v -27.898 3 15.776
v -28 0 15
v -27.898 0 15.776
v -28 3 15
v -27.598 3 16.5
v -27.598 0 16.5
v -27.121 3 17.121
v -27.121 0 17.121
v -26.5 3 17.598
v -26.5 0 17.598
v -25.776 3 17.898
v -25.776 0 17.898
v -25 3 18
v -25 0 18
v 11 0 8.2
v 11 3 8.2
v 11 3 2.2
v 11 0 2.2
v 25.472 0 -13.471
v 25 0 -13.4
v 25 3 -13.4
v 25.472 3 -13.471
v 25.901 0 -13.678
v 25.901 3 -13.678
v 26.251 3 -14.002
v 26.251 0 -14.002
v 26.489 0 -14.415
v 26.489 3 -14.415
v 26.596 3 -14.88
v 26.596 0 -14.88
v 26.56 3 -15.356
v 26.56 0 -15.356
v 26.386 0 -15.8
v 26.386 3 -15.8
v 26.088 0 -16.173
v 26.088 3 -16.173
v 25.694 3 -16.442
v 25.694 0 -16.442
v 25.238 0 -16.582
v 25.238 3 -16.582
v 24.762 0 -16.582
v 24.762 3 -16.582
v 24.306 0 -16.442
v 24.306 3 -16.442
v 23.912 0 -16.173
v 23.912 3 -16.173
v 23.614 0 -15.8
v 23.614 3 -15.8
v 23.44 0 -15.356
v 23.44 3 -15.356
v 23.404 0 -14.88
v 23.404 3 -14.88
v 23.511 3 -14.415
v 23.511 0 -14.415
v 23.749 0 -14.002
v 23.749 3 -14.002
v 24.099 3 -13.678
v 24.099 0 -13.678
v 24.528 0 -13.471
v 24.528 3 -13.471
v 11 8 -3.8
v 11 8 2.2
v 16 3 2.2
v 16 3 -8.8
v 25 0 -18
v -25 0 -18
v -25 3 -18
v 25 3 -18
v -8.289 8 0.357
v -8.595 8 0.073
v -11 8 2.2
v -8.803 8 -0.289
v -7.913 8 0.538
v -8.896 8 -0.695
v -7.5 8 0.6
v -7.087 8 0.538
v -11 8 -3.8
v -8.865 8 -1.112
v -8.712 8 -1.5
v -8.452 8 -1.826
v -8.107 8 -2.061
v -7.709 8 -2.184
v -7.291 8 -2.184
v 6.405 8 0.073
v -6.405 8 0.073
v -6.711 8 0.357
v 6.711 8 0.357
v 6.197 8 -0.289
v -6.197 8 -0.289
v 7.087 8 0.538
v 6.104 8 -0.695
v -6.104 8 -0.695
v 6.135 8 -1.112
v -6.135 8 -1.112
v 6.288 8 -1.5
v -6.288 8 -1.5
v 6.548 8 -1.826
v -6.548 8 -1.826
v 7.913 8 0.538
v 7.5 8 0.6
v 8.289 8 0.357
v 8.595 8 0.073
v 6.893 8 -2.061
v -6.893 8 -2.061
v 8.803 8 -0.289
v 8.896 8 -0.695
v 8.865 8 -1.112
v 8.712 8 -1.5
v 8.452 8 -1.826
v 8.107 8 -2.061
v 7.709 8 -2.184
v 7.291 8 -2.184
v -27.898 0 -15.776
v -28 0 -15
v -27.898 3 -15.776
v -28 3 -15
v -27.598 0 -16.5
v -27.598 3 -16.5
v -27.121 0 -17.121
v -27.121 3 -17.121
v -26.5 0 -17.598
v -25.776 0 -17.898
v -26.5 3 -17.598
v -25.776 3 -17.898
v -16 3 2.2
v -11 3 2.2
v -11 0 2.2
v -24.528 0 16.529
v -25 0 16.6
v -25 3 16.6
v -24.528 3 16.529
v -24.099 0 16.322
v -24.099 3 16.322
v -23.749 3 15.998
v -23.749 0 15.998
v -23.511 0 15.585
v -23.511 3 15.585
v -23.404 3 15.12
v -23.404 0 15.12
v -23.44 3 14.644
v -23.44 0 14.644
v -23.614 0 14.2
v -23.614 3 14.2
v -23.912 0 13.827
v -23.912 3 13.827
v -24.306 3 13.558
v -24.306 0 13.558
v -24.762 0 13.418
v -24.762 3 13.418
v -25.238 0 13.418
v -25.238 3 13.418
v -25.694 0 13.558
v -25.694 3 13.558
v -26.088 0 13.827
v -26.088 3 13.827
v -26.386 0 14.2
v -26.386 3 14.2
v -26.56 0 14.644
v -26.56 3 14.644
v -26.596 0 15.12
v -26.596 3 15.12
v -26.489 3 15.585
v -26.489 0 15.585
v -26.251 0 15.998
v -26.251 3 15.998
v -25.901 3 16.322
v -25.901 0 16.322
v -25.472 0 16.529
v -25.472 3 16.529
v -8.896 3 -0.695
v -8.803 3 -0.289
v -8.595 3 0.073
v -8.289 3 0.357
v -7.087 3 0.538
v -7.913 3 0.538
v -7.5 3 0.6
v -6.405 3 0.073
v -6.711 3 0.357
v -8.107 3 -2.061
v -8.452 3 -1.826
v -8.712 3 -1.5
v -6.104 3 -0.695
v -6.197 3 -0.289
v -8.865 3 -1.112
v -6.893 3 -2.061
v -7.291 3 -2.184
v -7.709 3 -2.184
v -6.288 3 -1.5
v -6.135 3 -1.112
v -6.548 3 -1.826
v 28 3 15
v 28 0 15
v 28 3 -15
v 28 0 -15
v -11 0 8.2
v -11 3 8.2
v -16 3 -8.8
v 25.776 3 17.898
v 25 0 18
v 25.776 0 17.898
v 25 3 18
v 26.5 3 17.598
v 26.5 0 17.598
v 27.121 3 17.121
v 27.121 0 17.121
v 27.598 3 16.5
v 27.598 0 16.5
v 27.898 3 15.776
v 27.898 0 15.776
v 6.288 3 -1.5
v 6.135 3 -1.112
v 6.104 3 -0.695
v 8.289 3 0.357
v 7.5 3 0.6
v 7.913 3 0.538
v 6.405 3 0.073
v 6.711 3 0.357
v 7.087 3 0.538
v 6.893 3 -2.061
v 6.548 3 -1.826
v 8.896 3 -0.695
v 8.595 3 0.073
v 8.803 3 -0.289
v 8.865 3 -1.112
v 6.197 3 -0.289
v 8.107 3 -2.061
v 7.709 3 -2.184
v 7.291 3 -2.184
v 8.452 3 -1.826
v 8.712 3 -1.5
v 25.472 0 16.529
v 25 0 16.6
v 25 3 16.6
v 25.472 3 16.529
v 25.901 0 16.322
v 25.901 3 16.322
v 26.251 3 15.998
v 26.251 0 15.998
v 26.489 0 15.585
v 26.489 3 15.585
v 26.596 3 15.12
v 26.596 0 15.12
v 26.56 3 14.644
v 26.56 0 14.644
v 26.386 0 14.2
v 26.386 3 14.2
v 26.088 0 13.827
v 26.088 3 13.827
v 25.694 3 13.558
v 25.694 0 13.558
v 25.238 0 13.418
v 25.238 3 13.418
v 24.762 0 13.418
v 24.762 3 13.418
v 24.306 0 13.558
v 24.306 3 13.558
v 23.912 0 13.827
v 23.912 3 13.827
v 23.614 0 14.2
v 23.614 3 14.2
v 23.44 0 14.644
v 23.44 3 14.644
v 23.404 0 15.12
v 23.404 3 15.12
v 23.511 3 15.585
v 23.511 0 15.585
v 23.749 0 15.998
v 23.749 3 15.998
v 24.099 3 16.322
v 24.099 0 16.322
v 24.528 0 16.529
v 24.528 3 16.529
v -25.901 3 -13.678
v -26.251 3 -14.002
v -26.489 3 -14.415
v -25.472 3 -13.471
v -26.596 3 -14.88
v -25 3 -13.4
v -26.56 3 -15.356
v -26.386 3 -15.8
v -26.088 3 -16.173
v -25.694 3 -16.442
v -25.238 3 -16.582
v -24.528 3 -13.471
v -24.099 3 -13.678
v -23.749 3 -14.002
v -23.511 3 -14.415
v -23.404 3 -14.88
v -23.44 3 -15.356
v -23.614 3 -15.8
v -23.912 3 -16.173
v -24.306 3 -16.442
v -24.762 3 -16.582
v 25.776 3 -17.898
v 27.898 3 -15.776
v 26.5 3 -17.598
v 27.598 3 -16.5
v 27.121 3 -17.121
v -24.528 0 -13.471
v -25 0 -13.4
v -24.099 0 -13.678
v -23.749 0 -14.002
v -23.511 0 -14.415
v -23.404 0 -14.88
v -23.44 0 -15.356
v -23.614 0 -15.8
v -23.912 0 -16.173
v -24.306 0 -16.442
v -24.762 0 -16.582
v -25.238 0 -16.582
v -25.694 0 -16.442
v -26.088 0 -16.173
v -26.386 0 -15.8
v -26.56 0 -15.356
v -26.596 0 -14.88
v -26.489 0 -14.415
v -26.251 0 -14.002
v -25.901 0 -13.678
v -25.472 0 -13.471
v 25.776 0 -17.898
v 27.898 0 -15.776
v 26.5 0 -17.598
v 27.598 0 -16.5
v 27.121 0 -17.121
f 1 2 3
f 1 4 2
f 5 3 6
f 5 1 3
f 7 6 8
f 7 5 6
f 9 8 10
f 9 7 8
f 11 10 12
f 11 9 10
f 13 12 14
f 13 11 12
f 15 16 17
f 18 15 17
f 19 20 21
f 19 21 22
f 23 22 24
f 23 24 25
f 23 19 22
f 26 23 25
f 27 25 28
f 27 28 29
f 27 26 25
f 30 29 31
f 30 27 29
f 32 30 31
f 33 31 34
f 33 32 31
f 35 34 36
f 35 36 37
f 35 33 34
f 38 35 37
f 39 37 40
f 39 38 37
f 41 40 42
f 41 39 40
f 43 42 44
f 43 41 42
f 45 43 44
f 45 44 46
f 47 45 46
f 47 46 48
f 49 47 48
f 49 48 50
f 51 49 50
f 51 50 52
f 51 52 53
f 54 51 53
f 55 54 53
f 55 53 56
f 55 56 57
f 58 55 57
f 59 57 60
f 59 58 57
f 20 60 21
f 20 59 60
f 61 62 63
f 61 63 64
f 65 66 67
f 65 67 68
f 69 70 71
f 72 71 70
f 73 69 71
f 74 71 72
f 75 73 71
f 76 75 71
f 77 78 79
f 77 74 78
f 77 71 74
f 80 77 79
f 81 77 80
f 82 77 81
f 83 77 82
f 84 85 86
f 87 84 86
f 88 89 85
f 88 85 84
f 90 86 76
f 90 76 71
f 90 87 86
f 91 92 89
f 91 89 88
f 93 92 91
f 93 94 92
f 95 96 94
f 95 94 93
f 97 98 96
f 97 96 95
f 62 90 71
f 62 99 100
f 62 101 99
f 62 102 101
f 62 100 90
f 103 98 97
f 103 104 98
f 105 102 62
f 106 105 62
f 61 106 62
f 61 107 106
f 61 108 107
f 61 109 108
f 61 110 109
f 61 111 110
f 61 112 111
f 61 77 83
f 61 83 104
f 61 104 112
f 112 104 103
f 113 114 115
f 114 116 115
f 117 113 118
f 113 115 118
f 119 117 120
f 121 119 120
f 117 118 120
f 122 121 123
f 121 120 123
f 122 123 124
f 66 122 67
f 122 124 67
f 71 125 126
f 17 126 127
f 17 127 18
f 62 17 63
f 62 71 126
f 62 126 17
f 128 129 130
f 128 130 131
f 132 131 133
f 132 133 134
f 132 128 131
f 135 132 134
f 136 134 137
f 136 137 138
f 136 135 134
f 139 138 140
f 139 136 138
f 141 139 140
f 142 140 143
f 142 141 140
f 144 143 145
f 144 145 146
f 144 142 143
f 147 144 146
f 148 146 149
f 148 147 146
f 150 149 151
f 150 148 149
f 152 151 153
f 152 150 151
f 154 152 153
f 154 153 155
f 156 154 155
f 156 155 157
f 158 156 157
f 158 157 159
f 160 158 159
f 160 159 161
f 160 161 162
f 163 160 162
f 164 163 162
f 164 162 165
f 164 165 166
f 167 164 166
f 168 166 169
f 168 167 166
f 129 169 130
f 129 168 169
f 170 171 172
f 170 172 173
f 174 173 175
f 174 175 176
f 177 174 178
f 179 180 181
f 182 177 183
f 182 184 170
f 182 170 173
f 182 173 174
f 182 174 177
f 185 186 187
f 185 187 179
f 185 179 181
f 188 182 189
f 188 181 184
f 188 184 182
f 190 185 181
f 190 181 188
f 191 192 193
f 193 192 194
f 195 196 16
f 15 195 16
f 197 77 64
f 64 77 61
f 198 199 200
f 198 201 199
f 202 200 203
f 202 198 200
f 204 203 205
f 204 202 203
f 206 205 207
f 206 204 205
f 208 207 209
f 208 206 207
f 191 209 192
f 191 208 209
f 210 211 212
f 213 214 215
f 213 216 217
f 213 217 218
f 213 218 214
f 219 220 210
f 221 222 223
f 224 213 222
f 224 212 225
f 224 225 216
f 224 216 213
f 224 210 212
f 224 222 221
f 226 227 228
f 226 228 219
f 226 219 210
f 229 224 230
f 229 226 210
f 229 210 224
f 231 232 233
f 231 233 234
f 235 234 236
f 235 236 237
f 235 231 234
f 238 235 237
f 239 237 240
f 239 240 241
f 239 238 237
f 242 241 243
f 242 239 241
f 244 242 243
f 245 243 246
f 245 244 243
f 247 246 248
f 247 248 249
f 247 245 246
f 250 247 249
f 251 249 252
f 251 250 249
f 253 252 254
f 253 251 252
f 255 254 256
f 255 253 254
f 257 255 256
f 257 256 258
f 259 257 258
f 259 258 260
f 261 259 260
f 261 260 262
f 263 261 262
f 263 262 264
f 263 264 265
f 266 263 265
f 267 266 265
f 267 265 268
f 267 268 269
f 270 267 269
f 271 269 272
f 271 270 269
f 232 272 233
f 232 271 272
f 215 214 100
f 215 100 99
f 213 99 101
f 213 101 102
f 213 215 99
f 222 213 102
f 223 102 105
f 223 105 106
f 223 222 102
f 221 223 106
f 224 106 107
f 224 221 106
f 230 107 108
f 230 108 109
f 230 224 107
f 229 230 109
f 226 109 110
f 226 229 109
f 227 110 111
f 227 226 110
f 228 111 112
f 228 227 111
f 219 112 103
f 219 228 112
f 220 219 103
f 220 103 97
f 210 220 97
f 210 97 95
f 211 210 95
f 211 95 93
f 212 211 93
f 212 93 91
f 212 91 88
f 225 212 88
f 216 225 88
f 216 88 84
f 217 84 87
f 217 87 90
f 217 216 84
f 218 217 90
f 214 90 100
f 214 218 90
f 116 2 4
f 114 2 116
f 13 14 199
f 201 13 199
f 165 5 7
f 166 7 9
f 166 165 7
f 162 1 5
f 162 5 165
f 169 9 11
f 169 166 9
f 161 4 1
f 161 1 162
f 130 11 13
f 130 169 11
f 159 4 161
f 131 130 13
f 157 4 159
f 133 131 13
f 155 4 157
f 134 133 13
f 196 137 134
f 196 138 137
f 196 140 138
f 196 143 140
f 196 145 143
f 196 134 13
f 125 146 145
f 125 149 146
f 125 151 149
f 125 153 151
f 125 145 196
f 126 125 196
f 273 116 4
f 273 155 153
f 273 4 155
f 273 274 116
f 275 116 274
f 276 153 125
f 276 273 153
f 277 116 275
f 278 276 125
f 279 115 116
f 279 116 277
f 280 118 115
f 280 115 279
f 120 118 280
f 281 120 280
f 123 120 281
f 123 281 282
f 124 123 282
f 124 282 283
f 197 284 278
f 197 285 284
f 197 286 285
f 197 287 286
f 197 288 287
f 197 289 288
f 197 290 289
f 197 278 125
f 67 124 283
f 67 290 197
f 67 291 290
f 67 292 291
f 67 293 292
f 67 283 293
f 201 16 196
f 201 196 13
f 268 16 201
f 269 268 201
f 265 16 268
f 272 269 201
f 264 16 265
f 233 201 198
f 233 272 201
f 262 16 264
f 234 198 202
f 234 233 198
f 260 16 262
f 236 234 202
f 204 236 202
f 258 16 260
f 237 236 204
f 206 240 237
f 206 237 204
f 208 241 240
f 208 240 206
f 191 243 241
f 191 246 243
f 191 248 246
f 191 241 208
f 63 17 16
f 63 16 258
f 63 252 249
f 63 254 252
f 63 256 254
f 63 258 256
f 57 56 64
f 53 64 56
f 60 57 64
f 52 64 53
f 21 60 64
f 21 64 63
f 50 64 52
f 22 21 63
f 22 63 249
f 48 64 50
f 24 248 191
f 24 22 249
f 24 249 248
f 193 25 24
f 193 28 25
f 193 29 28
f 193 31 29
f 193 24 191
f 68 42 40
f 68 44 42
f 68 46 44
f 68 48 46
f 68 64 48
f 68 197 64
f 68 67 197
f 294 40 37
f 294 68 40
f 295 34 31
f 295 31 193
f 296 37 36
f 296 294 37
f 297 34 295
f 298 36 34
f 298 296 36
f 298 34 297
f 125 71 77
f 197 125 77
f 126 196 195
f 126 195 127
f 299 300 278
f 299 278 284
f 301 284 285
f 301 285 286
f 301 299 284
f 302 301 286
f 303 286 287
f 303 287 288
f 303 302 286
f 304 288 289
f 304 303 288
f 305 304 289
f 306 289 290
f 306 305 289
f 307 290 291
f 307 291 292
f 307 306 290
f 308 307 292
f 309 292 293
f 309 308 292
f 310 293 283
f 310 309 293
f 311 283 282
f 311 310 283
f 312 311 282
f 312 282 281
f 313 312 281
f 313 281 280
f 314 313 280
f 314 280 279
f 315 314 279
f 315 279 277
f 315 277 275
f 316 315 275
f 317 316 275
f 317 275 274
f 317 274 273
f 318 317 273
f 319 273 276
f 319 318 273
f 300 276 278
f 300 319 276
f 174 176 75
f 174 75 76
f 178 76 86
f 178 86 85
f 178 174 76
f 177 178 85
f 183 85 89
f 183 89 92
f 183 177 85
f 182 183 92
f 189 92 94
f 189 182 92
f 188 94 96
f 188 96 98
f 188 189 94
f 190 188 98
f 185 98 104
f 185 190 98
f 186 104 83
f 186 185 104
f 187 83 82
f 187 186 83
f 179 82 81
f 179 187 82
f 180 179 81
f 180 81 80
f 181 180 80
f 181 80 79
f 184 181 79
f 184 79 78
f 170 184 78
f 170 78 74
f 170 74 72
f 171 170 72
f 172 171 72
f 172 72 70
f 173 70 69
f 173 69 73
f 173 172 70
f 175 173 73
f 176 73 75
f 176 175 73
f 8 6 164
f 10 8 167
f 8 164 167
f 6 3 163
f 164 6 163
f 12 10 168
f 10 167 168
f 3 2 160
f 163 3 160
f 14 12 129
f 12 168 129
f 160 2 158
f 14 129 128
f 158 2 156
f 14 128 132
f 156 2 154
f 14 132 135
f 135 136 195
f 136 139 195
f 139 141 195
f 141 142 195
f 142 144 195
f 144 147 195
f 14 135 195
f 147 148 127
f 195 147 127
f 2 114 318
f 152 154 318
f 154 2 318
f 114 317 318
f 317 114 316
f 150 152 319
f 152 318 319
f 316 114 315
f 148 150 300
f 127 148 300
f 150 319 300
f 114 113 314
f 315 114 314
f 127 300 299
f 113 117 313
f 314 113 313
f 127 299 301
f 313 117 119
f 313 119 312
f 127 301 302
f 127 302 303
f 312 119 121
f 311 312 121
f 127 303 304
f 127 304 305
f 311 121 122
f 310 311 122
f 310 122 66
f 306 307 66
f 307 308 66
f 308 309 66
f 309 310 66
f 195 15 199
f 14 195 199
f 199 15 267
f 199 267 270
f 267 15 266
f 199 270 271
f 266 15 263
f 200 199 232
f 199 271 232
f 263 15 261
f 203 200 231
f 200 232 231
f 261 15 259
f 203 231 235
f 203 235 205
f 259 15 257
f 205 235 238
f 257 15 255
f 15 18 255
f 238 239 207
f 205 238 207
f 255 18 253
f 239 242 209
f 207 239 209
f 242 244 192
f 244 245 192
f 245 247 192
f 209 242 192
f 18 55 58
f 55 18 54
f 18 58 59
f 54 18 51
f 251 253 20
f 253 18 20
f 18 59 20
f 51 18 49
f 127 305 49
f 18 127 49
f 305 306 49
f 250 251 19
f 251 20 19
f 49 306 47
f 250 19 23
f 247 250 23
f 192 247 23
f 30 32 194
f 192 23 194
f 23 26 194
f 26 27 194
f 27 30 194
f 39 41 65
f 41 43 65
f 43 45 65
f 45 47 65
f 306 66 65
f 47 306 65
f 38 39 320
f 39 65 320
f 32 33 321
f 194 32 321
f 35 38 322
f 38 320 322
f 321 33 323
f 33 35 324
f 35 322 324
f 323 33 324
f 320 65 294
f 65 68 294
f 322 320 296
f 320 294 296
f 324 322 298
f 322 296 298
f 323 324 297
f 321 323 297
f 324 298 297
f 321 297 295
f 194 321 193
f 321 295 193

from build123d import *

# Parameters (mm, degrees)
SKETCH_1_W          = 56
SKETCH_1_H          = 36
SKETCH_1_R          = 1.6
EXTRUDE_1_DEPTH     = 3
FILLET_1_R          = 3
SKETCH_2_W          = 22
SKETCH_2_H          = 6
SKETCH_2_R          = 1.4
EXTRUDE_2_DEPTH     = 5
SKETCH_3_W          = 22
SKETCH_3_H          = 6
CUT_EXTRUDE_1_DEPTH = 34.660065359
CHAMFER_1_SIZE      = 5


with BuildPart() as part:
    # ｽｹｯﾁ1 → ﾎﾞｽ - 押し出し1 (new body)
    with BuildSketch(Plane(origin=(0, 0, 0), x_dir=(1, 0, 0), z_dir=(0, 1, 0))):
        Rectangle(SKETCH_1_W, SKETCH_1_H)
        with Locations(Location((-25, 15, 0), (0, 0, 270))):
            Circle(SKETCH_1_R, mode=Mode.SUBTRACT)
        with Locations(Location((25, 15, 0), (0, 0, 270))):
            Circle(SKETCH_1_R, mode=Mode.SUBTRACT)
        with Locations(Location((25, -15, 0), (0, 0, 270))):
            Circle(SKETCH_1_R, mode=Mode.SUBTRACT)
        with Locations(Location((-25, -15, 0), (0, 0, 270))):
            Circle(SKETCH_1_R, mode=Mode.SUBTRACT)
    extrude(amount=EXTRUDE_1_DEPTH)

    # ﾌｨﾚｯﾄ1
    fillet_1_edges = [part.edges().sort_by_distance(p)[0] for p in [
        (28, 1.5, 18),
        (-28, 1.5, 18),
        (-28, 1.5, -18),
        (28, 1.5, -18),
    ]]
    fillet(fillet_1_edges, radius=FILLET_1_R)

    # ｽｹｯﾁ2 → ﾎﾞｽ - 押し出し2 (add)
    with BuildSketch(Plane(origin=(0, 3, 0), x_dir=(1, 0, 0), z_dir=(0, 1, 0))):
        with Locations((0, 0.8)):
            Rectangle(SKETCH_2_W, SKETCH_2_H)
        with Locations(Location((-7.5, 0.8, 0), (0, 0, 270))):
            Circle(SKETCH_2_R, mode=Mode.SUBTRACT)
        with Locations(Location((7.5, 0.8, 0), (0, 0, 270))):
            Circle(SKETCH_2_R, mode=Mode.SUBTRACT)
    extrude(amount=EXTRUDE_2_DEPTH)

    # ｽｹｯﾁ3 → ｶｯﾄ - 押し出し1 (cut, through all)
    with BuildSketch(Plane(origin=(0, 3, 0), x_dir=(1, 0, 0), z_dir=(0, 1, 0))):
        with Locations((0, -5.2)):
            Rectangle(SKETCH_3_W, SKETCH_3_H)
    extrude(amount=-CUT_EXTRUDE_1_DEPTH, mode=Mode.SUBTRACT)

    # 面取り1
    chamfer_1_edges = [part.edges().sort_by_distance(p)[0] for p in [
        (-11, 3, -0.8),
        (11, 3, -0.8),
        (0, 3, -3.8),
    ]]
    chamfer(chamfer_1_edges, length=CHAMFER_1_SIZE - 0.0001)  # a hair under: the kernel refuses the full size


solid = part.part
